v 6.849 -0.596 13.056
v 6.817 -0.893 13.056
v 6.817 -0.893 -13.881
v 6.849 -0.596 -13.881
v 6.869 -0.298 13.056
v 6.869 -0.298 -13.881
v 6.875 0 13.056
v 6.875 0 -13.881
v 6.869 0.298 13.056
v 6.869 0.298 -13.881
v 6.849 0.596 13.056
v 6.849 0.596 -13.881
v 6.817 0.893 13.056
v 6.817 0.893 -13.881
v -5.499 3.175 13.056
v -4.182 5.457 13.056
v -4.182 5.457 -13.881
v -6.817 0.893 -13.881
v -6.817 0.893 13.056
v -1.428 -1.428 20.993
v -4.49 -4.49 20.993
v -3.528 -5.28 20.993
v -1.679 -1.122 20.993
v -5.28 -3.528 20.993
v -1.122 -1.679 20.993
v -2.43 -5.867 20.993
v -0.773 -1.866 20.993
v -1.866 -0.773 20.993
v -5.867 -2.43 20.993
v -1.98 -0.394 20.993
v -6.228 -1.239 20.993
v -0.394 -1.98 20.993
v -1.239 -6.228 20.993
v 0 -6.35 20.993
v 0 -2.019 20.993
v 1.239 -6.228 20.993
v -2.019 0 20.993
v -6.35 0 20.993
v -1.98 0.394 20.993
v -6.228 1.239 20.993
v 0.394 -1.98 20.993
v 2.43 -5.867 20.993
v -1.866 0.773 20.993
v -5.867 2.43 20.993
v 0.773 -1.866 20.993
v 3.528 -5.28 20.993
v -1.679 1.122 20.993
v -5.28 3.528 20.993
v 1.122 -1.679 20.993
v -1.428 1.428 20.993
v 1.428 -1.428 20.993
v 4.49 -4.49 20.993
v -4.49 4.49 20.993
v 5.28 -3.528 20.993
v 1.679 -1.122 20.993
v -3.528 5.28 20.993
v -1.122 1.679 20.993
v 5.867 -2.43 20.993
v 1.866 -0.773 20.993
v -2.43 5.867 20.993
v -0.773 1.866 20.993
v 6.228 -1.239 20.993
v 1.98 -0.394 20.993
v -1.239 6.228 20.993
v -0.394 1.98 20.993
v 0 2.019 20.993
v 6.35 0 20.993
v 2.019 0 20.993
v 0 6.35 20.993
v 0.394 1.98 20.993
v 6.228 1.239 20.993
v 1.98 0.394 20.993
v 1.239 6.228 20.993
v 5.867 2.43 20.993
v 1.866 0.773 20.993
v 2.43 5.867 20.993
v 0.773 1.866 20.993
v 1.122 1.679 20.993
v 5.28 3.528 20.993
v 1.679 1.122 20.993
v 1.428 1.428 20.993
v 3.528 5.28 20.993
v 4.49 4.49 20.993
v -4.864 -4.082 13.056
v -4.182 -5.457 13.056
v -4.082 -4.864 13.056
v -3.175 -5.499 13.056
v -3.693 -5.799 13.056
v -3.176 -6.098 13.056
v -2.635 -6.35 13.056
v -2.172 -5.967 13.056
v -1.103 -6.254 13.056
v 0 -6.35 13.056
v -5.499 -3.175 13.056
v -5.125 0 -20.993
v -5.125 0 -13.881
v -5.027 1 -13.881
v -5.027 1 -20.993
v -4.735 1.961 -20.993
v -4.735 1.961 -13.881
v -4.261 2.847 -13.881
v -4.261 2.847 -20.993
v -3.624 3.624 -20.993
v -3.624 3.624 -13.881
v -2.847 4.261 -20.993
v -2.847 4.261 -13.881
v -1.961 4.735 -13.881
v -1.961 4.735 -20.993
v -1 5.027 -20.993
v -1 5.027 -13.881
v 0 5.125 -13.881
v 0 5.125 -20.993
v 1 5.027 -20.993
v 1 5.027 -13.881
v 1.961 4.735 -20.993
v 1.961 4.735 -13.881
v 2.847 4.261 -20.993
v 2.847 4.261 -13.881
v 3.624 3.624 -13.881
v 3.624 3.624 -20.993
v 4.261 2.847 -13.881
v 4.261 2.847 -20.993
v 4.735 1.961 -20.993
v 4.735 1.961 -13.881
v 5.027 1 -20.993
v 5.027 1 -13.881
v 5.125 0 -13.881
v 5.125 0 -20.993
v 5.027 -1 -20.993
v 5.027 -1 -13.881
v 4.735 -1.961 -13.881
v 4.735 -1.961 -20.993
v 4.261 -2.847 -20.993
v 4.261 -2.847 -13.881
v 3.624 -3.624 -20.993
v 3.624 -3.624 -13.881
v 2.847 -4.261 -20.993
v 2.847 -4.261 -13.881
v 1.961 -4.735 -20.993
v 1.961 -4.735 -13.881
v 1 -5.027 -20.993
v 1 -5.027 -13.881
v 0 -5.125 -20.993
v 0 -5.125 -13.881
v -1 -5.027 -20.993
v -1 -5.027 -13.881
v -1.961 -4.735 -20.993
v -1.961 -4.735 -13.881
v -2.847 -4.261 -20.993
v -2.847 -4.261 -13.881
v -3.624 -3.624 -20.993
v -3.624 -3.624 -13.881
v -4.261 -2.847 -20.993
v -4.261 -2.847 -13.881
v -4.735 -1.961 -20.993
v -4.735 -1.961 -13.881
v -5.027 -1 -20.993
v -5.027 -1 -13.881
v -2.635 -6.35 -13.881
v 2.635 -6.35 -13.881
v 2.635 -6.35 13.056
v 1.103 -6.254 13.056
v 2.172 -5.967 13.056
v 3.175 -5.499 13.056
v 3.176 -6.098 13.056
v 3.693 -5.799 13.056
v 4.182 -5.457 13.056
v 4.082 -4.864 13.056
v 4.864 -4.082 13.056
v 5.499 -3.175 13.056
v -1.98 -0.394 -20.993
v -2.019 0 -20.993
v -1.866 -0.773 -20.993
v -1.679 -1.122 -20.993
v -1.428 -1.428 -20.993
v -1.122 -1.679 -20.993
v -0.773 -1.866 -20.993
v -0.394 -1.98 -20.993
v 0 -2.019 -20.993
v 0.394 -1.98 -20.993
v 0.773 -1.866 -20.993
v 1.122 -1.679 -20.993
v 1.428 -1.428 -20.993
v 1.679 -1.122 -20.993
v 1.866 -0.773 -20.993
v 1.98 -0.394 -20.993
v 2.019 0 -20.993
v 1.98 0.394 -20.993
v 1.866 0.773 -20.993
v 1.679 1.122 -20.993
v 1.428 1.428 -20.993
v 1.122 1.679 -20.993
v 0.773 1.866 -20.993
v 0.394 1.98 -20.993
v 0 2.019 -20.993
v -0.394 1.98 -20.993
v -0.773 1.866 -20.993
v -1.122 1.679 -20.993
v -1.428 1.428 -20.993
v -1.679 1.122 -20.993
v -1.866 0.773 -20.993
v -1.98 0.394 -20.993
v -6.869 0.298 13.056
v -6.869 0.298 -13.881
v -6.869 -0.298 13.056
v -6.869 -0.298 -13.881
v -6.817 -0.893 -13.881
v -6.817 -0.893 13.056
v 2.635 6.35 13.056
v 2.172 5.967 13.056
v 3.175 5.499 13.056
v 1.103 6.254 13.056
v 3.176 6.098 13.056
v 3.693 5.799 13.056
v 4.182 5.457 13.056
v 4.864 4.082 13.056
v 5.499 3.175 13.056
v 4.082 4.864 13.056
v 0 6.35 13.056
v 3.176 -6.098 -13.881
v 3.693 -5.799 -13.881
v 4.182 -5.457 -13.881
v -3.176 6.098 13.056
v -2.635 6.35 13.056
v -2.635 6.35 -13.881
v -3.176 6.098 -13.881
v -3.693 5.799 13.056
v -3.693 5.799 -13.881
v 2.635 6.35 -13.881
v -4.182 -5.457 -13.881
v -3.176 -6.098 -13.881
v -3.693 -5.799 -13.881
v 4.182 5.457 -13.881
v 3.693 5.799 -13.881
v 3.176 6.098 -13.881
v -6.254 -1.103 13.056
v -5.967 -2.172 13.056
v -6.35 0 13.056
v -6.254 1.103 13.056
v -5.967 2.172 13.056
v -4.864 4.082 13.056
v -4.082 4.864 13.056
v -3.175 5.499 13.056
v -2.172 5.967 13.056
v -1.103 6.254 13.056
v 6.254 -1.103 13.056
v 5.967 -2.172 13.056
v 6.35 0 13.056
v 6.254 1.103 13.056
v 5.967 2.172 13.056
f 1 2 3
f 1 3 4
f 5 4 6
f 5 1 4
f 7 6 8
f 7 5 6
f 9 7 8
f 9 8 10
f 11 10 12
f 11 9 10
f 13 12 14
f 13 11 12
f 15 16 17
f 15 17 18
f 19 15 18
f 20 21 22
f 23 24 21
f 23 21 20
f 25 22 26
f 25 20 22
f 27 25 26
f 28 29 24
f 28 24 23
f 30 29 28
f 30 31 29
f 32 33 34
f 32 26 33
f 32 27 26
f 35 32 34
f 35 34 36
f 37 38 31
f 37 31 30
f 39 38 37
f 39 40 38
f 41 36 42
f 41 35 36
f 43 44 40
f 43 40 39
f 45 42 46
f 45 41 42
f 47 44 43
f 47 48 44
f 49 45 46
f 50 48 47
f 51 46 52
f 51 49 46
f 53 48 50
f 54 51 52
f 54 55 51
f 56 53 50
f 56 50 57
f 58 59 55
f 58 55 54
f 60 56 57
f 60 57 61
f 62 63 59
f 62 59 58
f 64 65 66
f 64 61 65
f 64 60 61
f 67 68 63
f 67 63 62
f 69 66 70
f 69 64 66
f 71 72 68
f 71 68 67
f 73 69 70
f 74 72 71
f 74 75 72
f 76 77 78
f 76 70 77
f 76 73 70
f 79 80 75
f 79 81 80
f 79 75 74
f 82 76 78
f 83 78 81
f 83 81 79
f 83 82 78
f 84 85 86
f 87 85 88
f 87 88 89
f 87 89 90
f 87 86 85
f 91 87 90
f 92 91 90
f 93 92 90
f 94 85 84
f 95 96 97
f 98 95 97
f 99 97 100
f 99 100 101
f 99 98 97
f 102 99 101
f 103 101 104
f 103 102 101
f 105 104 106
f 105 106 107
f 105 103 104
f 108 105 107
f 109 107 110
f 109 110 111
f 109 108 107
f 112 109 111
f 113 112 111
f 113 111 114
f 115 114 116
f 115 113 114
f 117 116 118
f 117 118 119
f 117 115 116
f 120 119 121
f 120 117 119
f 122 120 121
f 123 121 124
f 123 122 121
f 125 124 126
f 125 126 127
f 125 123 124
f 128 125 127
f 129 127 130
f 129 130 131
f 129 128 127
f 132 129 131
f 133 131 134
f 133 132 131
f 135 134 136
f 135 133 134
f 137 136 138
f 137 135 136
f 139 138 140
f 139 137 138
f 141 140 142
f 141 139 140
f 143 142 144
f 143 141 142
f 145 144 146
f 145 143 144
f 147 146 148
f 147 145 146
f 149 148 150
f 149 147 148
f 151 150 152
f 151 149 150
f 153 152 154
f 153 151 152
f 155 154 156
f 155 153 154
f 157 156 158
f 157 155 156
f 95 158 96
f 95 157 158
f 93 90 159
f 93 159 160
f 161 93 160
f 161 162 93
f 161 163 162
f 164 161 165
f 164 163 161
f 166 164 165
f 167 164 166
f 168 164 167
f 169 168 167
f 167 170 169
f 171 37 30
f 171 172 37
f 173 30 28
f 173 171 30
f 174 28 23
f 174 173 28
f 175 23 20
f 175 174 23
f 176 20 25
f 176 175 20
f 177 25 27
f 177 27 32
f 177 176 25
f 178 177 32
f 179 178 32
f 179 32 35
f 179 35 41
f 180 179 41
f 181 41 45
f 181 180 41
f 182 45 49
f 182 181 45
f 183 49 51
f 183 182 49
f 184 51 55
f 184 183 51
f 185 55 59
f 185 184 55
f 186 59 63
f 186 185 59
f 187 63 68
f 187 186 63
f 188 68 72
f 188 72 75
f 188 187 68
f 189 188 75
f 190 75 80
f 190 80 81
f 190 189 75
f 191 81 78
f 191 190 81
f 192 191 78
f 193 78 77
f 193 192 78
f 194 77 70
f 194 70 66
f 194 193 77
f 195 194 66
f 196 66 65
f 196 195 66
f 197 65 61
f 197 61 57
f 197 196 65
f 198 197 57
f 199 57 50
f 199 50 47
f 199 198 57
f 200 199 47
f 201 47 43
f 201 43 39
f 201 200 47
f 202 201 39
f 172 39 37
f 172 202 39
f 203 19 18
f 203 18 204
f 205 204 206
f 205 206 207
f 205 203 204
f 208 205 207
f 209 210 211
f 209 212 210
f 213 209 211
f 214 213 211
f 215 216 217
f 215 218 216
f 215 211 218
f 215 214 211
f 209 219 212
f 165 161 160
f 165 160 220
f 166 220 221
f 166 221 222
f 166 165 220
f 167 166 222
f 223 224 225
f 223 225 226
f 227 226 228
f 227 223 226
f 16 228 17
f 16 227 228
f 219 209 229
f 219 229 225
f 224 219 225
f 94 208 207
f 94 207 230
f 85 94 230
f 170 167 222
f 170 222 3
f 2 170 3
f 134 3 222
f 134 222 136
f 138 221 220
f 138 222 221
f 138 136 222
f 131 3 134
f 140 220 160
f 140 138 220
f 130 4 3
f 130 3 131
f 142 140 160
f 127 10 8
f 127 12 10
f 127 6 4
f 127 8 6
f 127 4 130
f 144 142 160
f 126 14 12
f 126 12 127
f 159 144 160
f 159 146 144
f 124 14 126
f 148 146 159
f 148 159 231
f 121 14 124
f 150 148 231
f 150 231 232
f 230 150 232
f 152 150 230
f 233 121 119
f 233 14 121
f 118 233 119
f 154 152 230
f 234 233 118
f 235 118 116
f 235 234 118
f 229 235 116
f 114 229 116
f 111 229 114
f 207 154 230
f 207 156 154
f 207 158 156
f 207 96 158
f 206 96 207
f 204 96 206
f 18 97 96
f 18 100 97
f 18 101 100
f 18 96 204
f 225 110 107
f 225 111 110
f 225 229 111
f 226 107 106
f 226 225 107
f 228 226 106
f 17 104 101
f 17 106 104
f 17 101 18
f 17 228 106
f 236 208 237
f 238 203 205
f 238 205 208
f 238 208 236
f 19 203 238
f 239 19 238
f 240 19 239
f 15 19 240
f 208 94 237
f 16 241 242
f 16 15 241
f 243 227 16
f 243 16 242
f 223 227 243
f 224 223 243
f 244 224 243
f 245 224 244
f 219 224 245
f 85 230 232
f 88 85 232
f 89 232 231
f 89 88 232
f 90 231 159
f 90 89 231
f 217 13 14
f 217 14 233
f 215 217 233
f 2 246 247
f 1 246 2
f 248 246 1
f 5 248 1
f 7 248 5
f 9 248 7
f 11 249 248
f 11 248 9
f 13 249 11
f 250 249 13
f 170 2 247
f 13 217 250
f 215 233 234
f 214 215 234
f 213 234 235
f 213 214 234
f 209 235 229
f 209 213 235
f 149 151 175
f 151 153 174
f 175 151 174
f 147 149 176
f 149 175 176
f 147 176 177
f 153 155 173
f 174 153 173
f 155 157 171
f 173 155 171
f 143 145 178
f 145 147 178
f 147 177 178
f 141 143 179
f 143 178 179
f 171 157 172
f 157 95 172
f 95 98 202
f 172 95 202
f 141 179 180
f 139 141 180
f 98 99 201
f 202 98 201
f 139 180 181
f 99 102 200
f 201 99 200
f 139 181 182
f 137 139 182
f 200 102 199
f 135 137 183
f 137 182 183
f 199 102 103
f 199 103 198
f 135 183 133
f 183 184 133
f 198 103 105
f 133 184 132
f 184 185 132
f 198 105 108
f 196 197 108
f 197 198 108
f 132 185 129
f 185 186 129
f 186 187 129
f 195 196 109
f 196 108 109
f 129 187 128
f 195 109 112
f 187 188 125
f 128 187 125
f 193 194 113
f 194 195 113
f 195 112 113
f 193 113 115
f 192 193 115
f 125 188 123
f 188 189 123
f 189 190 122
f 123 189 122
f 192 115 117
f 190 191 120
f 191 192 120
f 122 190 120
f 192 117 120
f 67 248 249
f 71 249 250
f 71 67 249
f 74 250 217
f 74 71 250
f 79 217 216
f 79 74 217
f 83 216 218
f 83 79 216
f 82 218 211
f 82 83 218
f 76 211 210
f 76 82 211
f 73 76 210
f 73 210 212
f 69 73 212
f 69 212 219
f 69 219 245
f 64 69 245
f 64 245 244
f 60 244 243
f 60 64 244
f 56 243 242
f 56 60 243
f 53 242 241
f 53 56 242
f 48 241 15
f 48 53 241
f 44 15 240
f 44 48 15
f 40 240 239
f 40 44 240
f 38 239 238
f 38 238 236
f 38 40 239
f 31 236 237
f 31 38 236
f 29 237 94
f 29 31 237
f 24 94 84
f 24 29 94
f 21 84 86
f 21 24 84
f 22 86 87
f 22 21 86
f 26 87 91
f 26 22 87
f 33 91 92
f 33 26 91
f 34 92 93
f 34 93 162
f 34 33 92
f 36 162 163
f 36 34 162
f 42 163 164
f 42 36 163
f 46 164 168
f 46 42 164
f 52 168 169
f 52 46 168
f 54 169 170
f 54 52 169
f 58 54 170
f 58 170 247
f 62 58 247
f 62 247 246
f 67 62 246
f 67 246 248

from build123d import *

# Parameters (mm, degrees)
SKETCH1_R                            = 2.0193
BOSS_EXTRUDE1_DEPTH                  = 20.9931
F_10_32_TAPPED_HOLE1_D               = 4.0386
F_10_32_TAPPED_HOLE1_DEPTH           = 11.938
F_10_32_TAPPED_HOLE1_TIP             = 1.213317848
F_10_32_TAPPED_HOLE1_ON_FACE_2_D     = 4.0386
F_10_32_TAPPED_HOLE1_ON_FACE_2_DEPTH = 11.938
F_10_32_TAPPED_HOLE1_ON_FACE_2_TIP   = 1.213317848
SKETCH4_R                            = 8.89
SKETCH4_R_2                          = 6.35
CUT_EXTRUDE_THIN1_DEPTH              = 7.9375
SKETCH5_R                            = 7.665000037
SKETCH5_R_2                          = 5.125000037
CUT_EXTRUDE_THIN2_DEPTH              = 7.112


with BuildPart() as part:
    # Sketch1 → Boss-Extrude1 (new, symmetric)
    with BuildSketch(Plane.XY):
        with BuildLine():
            ThreePointArc((6.874999966, 0), (6.860422465, 0.447468582), (6.816751782, 0.893039571))
            Line((6.816751782, 0.893039571), (4.181770846, 5.456960429))
            ThreePointArc((4.181770846, 5.456960429), (3.437499983, 5.953924622), (2.634980936, 6.35))
            Line((2.634980936, 6.35), (-2.634980936, 6.35))
            ThreePointArc((-2.634980936, 6.35), (-3.437499983, 5.953924622), (-4.181770846, 5.456960429))
            Line((-4.181770846, 5.456960429), (-6.816751782, 0.893039571))
            ThreePointArc((-6.816751782, 0.893039571), (-6.874999966, 0), (-6.816751782, -0.893039571))
            Line((-6.816751782, -0.893039571), (-4.181770846, -5.456960429))
            ThreePointArc((-4.181770846, -5.456960429), (-3.437499983, -5.953924622), (-2.634980936, -6.35))
            Line((-2.634980936, -6.35), (2.634980936, -6.35))
            ThreePointArc((2.634980936, -6.35), (3.437499983, -5.953924622), (4.181770846, -5.456960429))
            Line((4.181770846, -5.456960429), (6.816751782, -0.893039571))
            ThreePointArc((6.816751782, -0.893039571), (6.860422465, -0.447468582), (6.874999966, 0))
        make_face()
        with Locations(Location((0, 0, 0), (0, 0, 180))):
            Circle(SKETCH1_R, mode=Mode.SUBTRACT)
    extrude(amount=BOSS_EXTRUDE1_DEPTH, both=True)

    # #10-32 Tapped Hole1
    with Locations(Plane.XY.offset(20.9931)):
        with Locations((0, 0)):
            Hole(F_10_32_TAPPED_HOLE1_D / 2, depth=F_10_32_TAPPED_HOLE1_DEPTH)
            with Locations((0, 0, -(F_10_32_TAPPED_HOLE1_DEPTH + F_10_32_TAPPED_HOLE1_TIP / 2))):  # 118° drill point
                Cone(0, F_10_32_TAPPED_HOLE1_D / 2, F_10_32_TAPPED_HOLE1_TIP, mode=Mode.SUBTRACT)

    # #10-32 Tapped Hole1 on face 2
    with Locations(Plane.XY.offset(-20.9931)):
        with Locations((0, 0)):
            Hole(F_10_32_TAPPED_HOLE1_ON_FACE_2_D / 2, depth=F_10_32_TAPPED_HOLE1_ON_FACE_2_DEPTH)
            with Locations((0, 0, -(F_10_32_TAPPED_HOLE1_ON_FACE_2_DEPTH + F_10_32_TAPPED_HOLE1_ON_FACE_2_TIP / 2))):  # 118° drill point
                Cone(0, F_10_32_TAPPED_HOLE1_ON_FACE_2_D / 2, F_10_32_TAPPED_HOLE1_ON_FACE_2_TIP, mode=Mode.SUBTRACT)

    # Sketch4 → Cut-Extrude-Thin1 (cut)
    with BuildSketch(Plane.XY.offset(20.9931)):
        Circle(SKETCH4_R)
        Circle(SKETCH4_R_2, mode=Mode.SUBTRACT)
    extrude(amount=-CUT_EXTRUDE_THIN1_DEPTH, mode=Mode.SUBTRACT)

    # Sketch5 → Cut-Extrude-Thin2 (cut)
    with BuildSketch(Plane(origin=(0, 0, -20.9931), x_dir=(-1, 0, 0), z_dir=(0, 0, -1))):
        Circle(SKETCH5_R)
        Circle(SKETCH5_R_2, mode=Mode.SUBTRACT)
    extrude(amount=-CUT_EXTRUDE_THIN2_DEPTH, mode=Mode.SUBTRACT)


solid = part.part
